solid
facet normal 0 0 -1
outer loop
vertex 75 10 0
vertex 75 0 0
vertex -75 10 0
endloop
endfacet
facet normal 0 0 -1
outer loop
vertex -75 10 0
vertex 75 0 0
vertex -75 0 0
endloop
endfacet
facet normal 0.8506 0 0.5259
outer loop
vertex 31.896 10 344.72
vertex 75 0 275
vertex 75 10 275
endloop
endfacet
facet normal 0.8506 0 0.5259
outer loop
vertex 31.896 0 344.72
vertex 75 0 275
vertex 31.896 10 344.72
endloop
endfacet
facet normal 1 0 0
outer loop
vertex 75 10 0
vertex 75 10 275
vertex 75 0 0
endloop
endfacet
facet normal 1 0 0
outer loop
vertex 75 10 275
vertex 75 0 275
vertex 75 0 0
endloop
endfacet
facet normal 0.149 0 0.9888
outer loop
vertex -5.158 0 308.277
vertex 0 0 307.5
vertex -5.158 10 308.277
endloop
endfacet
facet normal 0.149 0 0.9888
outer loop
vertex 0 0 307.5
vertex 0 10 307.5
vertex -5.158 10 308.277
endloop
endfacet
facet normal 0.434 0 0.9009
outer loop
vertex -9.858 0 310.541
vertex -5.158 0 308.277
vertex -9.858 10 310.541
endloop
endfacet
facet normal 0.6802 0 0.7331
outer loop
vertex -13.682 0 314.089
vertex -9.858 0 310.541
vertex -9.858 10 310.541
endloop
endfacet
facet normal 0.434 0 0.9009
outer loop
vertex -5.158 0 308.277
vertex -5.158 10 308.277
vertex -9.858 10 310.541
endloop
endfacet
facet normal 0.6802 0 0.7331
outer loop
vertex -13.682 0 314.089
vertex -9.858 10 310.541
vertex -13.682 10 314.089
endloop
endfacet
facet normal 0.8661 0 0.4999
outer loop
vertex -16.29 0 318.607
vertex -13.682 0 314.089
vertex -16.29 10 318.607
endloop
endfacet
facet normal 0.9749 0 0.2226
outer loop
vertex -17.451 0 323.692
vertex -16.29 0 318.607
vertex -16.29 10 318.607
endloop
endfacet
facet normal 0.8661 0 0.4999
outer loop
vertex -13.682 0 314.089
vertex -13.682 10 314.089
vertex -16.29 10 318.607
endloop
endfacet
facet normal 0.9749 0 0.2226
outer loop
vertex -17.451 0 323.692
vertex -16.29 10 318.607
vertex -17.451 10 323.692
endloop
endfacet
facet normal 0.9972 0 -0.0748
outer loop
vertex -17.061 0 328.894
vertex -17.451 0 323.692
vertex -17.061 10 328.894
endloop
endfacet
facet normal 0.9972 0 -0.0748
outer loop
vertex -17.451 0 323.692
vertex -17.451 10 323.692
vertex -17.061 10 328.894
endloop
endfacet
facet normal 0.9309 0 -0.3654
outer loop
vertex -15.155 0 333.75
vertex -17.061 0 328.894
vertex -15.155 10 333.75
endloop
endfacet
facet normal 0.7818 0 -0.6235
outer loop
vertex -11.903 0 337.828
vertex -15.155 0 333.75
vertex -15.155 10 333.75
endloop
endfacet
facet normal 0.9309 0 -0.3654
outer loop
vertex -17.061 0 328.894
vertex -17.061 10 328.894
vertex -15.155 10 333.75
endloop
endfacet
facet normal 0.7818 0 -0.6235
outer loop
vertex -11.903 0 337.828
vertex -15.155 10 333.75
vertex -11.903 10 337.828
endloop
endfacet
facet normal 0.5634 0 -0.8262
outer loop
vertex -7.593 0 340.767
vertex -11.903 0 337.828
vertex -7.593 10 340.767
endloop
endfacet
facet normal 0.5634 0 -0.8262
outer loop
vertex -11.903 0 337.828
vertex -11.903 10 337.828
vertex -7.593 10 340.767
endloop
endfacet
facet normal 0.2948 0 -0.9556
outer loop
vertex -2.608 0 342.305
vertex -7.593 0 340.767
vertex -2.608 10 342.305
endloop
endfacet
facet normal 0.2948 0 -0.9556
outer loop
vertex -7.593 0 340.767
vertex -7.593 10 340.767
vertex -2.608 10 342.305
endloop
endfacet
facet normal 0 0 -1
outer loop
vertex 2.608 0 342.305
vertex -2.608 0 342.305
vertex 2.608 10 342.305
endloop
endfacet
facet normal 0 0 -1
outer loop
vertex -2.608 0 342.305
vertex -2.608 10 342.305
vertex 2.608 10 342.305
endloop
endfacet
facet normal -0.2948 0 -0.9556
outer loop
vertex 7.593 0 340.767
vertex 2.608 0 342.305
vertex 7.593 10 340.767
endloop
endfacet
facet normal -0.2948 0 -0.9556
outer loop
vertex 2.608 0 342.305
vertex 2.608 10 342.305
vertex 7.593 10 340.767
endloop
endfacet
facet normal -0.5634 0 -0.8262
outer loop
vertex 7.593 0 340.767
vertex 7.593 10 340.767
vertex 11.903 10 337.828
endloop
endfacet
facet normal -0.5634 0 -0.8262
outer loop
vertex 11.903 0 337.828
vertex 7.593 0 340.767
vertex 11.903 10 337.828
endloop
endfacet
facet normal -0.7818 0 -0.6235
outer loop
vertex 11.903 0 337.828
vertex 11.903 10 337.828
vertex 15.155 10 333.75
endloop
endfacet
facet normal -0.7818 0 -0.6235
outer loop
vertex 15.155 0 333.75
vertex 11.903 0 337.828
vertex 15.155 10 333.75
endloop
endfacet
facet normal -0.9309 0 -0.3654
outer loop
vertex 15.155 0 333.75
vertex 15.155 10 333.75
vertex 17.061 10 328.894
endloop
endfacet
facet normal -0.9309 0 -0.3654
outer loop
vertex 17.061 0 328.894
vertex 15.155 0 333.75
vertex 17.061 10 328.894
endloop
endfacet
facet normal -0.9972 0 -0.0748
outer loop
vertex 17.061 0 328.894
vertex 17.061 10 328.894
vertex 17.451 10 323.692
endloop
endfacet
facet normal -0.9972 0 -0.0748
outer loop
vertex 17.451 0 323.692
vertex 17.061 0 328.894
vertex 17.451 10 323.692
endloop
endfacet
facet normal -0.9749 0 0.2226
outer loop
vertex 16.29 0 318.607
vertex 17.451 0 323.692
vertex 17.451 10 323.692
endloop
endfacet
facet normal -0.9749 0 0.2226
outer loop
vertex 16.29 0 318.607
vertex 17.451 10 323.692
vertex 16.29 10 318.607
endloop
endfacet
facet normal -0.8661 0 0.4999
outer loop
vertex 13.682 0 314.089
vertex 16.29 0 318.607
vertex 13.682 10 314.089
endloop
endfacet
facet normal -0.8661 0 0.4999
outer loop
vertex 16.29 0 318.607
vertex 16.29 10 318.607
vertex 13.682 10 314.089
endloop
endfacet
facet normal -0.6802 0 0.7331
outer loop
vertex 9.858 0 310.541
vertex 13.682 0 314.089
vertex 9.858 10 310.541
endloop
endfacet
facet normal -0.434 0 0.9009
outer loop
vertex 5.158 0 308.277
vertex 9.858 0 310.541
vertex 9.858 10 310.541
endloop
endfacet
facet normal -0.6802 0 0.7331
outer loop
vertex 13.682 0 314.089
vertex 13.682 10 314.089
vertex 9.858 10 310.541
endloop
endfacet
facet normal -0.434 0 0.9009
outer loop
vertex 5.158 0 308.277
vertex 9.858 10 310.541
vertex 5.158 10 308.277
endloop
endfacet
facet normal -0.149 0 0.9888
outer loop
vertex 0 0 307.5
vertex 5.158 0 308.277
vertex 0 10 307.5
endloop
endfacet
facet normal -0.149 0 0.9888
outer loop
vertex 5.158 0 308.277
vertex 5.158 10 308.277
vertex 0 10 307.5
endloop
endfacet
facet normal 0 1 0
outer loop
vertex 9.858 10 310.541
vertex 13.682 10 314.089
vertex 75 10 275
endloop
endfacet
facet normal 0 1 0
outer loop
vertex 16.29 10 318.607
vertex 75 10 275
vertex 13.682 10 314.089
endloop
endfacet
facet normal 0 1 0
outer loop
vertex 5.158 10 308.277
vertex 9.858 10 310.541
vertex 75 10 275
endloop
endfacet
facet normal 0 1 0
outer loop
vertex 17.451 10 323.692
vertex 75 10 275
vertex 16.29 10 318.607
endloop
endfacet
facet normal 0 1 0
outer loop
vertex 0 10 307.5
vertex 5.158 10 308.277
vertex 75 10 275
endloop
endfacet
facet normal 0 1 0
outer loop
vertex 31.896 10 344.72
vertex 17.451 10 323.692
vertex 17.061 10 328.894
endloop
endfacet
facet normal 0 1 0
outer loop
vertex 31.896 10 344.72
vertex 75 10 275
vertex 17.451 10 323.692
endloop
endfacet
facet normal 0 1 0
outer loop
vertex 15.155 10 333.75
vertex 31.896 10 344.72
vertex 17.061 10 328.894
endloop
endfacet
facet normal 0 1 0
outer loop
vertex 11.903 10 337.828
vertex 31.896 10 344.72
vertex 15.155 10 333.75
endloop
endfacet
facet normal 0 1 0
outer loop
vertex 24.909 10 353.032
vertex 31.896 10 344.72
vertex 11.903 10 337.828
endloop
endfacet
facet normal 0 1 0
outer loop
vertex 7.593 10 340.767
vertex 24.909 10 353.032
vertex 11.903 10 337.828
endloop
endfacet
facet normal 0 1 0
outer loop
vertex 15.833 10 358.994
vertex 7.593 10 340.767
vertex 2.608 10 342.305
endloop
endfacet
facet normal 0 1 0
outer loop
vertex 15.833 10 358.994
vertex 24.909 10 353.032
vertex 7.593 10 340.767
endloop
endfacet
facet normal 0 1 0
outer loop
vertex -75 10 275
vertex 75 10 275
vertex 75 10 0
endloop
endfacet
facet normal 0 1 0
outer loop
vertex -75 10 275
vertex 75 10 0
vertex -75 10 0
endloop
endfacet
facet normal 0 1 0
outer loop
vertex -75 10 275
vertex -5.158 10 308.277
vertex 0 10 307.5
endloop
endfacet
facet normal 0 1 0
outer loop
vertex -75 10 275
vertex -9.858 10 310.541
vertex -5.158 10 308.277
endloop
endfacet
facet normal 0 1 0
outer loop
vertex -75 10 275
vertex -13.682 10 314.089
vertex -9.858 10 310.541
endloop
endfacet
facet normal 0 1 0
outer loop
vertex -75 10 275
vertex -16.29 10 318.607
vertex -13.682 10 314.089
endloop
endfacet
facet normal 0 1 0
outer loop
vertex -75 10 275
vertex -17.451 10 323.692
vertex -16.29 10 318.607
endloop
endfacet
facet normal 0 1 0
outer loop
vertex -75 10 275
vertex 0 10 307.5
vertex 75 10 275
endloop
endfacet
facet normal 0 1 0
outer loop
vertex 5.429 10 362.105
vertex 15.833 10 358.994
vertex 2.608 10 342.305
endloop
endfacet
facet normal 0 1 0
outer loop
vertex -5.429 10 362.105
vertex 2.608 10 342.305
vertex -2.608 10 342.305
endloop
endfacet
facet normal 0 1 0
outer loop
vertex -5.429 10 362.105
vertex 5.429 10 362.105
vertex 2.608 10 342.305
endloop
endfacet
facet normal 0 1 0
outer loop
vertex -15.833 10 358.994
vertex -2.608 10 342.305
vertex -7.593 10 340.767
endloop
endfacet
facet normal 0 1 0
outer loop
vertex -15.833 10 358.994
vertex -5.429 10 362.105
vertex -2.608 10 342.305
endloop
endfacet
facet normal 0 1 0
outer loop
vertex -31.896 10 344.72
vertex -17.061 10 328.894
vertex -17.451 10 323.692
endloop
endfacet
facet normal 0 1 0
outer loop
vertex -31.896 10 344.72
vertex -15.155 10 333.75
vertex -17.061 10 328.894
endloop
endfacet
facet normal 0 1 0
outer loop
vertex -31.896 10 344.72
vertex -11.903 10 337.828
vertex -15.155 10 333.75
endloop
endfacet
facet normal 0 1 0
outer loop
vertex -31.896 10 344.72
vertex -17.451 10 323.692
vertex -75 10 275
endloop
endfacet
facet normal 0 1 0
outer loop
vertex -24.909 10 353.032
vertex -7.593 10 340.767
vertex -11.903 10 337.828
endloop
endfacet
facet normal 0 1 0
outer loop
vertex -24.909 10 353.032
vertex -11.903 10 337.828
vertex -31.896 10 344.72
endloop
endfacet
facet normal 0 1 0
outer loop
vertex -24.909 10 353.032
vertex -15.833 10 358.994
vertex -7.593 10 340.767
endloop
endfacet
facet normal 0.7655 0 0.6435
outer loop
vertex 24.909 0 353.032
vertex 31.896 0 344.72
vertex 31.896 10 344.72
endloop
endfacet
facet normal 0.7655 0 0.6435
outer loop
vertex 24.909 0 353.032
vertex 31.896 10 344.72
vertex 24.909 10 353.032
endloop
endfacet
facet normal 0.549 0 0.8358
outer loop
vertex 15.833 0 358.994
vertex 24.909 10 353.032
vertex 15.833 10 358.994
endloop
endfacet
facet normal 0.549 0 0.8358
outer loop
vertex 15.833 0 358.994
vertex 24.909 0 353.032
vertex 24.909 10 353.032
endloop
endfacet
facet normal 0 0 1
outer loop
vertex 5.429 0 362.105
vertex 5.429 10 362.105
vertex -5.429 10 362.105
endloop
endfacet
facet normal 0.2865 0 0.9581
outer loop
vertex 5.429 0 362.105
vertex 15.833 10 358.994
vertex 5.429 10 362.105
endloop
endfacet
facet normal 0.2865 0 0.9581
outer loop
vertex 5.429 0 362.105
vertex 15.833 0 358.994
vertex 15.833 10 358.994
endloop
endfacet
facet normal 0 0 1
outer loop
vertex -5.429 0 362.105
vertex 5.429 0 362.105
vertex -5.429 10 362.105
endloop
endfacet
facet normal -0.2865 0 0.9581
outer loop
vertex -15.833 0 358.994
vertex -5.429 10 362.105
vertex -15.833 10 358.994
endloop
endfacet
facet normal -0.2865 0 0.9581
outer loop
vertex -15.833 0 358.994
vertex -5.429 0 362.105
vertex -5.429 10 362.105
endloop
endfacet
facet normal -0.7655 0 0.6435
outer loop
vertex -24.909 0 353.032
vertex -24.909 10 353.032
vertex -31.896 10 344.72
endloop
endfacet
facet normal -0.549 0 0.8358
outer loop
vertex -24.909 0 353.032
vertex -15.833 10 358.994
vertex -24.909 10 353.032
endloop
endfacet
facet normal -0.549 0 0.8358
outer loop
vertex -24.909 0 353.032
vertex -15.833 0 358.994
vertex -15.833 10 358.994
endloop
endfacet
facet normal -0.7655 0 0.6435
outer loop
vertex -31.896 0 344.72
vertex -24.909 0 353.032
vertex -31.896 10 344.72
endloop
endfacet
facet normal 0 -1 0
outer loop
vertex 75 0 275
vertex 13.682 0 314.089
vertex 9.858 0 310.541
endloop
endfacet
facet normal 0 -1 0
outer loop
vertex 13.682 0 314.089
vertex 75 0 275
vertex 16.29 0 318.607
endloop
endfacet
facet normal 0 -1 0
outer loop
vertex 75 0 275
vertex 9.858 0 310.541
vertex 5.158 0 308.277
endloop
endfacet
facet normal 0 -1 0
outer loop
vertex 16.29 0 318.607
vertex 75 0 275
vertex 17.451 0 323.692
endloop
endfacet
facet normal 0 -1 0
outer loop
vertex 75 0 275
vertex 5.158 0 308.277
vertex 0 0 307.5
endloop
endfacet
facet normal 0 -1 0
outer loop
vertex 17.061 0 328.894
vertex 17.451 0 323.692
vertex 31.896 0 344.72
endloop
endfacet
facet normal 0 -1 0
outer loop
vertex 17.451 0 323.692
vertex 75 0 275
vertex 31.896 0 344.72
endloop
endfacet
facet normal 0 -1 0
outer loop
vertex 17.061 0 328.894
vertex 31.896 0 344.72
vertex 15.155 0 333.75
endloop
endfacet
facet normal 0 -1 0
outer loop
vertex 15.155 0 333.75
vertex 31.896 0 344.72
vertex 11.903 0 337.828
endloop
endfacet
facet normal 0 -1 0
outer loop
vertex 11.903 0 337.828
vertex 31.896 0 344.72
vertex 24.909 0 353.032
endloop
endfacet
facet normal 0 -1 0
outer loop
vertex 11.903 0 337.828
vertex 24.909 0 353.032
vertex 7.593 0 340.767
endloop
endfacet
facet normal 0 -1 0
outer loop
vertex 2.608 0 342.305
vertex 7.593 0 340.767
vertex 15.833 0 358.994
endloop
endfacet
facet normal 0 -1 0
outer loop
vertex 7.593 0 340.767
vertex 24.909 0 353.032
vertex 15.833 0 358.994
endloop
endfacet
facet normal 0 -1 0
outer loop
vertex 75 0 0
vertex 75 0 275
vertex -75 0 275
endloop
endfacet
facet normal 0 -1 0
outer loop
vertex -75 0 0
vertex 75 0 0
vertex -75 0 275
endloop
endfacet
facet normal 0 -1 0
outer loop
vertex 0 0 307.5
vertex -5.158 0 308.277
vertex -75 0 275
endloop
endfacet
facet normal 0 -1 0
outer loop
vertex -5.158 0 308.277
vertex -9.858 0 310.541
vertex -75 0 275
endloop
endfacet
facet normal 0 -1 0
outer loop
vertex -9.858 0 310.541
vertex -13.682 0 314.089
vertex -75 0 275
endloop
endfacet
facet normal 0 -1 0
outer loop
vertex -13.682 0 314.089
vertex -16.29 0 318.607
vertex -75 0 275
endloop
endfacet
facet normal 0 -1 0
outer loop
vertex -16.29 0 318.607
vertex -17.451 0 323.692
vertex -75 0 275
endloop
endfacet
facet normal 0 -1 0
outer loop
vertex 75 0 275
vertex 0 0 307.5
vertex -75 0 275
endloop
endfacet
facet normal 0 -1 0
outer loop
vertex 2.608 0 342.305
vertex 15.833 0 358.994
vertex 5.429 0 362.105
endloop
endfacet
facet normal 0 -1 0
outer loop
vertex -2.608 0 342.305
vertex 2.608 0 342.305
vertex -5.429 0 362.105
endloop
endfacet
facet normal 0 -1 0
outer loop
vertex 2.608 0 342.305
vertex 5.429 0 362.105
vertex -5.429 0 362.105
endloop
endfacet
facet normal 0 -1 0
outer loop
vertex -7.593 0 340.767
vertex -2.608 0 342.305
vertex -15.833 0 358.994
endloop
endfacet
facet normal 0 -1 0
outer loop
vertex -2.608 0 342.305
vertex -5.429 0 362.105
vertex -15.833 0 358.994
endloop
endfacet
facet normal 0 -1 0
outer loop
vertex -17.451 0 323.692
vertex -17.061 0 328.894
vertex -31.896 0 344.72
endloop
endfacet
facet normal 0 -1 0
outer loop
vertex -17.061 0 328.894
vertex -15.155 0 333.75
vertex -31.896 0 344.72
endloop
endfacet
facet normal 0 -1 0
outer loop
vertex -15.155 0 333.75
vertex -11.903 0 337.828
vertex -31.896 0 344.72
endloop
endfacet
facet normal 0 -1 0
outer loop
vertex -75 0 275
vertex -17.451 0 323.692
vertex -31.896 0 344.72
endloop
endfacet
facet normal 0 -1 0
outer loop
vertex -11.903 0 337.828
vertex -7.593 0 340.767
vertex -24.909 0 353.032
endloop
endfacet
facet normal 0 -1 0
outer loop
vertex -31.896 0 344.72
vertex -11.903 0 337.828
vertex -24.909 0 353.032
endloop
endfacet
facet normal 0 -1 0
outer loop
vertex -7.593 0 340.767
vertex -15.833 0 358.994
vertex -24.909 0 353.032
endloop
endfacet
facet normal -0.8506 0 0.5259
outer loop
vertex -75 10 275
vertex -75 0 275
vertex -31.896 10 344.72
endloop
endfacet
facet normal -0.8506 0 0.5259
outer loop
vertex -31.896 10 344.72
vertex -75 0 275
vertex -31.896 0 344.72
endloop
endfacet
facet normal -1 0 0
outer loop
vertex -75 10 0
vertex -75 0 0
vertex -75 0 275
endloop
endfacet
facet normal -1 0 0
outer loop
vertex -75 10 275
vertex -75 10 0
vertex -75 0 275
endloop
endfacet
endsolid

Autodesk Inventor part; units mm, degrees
ref_plane "Work Plane2" through (-75, 10, 210) normal (0, 0, 1) x (1, 0, 0)
ref_plane "YZ Plane" through (0, 0, 0) normal (1, 0, 0) x (0, 1, 0)
ref_plane "XZ Plane" through (0, 0, 0) normal (0, 1, 0) x (-1, 0, 0)
sketch "Sketch1" plane through (0, 0, 0) normal (0, 1, 0) x (-1, 0, 0)
  line L0 (-75, 0) -> (75, 0)
  line L1 (75, 0) -> (75, 275)
  line L2 (75, 275) -> (-75, 275) construction
  line L3 (-75, 275) -> (-75, 0)
  circle A0 centre (0, 325) radius 37.5
  line L4 (-75, 275) -> (-31.8965, 344.7197)
  line L5 (75, 275) -> (31.8965, 344.7197)
  point P0 (0, 0)
  point P1 (0, 0)
  dimension "d2" = 75
  dimension "d3" = 50
extrude "Extrusion1" add sketch "Sketch1" along normal blind 10
sketch "Sketch2" plane through (0, 0, 0) normal (0, -1, 0) x (1, 0, 0)
  arc A0 (31.8965, 344.7197) -> (-31.8965, 344.7197) centre (0, 325) ccw projected
  point P0 (0, 0)
hole "Hole1" at (0, 0, 325) direction (0, 1, 0) diameter 35 end through all
sketch "Sketch3" plane through (-75, 0, 0) normal (-1, 0, 0) x (0, 0, 1)
  line L0 (11, 10) -> (11, 54)
  line L1 (11, 54) -> (41, 84)
  line L2 (41, 84) -> (159, 84)
  line L3 (159, 84) -> (189, 54)
  line L4 (189, 54) -> (189, 10)
  line L5 (0, 10) -> (275, 10) projected
  line L6 (189, 10) -> (11, 10)
  dimension "d14" = 135
  dimension "d18" = 11
  dimension "d19" = 74
  dimension "d20" = 30
  dimension "d22" = 178
  dimension "d26" = 21
sketch "Sketch6" plane through (-75, 10, 210) normal (0, 0, 1) x (1, 0, 0)
  line L0 (0, 0) -> (10, 0)
  line L1 (10, 0) -> (10, 25)
  line L2 (10, 25) -> (0, 25)
  line L3 (0, 25) -> (0, 0)
  point P0 (75, -10)
  dimension "d27" = 10
  dimension "d28" = 25
sketch3d "3D Sketch1"
sketch "Sketch7" plane through (0, 10, 0) normal (0, 1, 0) x (1, 0, 0)
  circle A0 centre (0, -325) radius 17.5 projected
  circle A1 centre (0, -325) radius 27.5
  point P0 (0, 0)
  dimension "d31" = 10
sketch "Sketch8" plane through (-75, 35, 210) normal (0, 1, 0) x (1, 0, 0)
  line L0 (0, -65) -> (43.1035, -134.7197) projected
  arc A0 (43.1035, -134.7197) -> (106.8965, -134.7197) centre (75, -115) ccw projected
  line L1 (106.8965, -134.7197) -> (150, -65) projected
  line L2 (150, -65) -> (150, 0) projected
  line L3 (140, 0) -> (150, 0) projected
  line L4 (140, -62.1584) -> (140, 0) projected
  line L5 (98.3907, -129.4611) -> (140, -62.1584) projected
  arc A1 (51.6093, -129.4611) -> (98.3907, -129.4611) centre (75, -115) ccw projected
  line L6 (10, -62.1584) -> (51.6093, -129.4611) projected
  line L7 (10, 0) -> (10, -62.1584) projected
  line L8 (10, 0) -> (0, 0) projected
  line L9 (0, 0) -> (0, -65) projected
  line L10 (140, 0) -> (10, 0)
  circle A2 centre (75, -115) radius 17.5 projected
  point P0 (75, 210)
properties part number "Skid Lifting Plate" material "Steel, Galvanized"
